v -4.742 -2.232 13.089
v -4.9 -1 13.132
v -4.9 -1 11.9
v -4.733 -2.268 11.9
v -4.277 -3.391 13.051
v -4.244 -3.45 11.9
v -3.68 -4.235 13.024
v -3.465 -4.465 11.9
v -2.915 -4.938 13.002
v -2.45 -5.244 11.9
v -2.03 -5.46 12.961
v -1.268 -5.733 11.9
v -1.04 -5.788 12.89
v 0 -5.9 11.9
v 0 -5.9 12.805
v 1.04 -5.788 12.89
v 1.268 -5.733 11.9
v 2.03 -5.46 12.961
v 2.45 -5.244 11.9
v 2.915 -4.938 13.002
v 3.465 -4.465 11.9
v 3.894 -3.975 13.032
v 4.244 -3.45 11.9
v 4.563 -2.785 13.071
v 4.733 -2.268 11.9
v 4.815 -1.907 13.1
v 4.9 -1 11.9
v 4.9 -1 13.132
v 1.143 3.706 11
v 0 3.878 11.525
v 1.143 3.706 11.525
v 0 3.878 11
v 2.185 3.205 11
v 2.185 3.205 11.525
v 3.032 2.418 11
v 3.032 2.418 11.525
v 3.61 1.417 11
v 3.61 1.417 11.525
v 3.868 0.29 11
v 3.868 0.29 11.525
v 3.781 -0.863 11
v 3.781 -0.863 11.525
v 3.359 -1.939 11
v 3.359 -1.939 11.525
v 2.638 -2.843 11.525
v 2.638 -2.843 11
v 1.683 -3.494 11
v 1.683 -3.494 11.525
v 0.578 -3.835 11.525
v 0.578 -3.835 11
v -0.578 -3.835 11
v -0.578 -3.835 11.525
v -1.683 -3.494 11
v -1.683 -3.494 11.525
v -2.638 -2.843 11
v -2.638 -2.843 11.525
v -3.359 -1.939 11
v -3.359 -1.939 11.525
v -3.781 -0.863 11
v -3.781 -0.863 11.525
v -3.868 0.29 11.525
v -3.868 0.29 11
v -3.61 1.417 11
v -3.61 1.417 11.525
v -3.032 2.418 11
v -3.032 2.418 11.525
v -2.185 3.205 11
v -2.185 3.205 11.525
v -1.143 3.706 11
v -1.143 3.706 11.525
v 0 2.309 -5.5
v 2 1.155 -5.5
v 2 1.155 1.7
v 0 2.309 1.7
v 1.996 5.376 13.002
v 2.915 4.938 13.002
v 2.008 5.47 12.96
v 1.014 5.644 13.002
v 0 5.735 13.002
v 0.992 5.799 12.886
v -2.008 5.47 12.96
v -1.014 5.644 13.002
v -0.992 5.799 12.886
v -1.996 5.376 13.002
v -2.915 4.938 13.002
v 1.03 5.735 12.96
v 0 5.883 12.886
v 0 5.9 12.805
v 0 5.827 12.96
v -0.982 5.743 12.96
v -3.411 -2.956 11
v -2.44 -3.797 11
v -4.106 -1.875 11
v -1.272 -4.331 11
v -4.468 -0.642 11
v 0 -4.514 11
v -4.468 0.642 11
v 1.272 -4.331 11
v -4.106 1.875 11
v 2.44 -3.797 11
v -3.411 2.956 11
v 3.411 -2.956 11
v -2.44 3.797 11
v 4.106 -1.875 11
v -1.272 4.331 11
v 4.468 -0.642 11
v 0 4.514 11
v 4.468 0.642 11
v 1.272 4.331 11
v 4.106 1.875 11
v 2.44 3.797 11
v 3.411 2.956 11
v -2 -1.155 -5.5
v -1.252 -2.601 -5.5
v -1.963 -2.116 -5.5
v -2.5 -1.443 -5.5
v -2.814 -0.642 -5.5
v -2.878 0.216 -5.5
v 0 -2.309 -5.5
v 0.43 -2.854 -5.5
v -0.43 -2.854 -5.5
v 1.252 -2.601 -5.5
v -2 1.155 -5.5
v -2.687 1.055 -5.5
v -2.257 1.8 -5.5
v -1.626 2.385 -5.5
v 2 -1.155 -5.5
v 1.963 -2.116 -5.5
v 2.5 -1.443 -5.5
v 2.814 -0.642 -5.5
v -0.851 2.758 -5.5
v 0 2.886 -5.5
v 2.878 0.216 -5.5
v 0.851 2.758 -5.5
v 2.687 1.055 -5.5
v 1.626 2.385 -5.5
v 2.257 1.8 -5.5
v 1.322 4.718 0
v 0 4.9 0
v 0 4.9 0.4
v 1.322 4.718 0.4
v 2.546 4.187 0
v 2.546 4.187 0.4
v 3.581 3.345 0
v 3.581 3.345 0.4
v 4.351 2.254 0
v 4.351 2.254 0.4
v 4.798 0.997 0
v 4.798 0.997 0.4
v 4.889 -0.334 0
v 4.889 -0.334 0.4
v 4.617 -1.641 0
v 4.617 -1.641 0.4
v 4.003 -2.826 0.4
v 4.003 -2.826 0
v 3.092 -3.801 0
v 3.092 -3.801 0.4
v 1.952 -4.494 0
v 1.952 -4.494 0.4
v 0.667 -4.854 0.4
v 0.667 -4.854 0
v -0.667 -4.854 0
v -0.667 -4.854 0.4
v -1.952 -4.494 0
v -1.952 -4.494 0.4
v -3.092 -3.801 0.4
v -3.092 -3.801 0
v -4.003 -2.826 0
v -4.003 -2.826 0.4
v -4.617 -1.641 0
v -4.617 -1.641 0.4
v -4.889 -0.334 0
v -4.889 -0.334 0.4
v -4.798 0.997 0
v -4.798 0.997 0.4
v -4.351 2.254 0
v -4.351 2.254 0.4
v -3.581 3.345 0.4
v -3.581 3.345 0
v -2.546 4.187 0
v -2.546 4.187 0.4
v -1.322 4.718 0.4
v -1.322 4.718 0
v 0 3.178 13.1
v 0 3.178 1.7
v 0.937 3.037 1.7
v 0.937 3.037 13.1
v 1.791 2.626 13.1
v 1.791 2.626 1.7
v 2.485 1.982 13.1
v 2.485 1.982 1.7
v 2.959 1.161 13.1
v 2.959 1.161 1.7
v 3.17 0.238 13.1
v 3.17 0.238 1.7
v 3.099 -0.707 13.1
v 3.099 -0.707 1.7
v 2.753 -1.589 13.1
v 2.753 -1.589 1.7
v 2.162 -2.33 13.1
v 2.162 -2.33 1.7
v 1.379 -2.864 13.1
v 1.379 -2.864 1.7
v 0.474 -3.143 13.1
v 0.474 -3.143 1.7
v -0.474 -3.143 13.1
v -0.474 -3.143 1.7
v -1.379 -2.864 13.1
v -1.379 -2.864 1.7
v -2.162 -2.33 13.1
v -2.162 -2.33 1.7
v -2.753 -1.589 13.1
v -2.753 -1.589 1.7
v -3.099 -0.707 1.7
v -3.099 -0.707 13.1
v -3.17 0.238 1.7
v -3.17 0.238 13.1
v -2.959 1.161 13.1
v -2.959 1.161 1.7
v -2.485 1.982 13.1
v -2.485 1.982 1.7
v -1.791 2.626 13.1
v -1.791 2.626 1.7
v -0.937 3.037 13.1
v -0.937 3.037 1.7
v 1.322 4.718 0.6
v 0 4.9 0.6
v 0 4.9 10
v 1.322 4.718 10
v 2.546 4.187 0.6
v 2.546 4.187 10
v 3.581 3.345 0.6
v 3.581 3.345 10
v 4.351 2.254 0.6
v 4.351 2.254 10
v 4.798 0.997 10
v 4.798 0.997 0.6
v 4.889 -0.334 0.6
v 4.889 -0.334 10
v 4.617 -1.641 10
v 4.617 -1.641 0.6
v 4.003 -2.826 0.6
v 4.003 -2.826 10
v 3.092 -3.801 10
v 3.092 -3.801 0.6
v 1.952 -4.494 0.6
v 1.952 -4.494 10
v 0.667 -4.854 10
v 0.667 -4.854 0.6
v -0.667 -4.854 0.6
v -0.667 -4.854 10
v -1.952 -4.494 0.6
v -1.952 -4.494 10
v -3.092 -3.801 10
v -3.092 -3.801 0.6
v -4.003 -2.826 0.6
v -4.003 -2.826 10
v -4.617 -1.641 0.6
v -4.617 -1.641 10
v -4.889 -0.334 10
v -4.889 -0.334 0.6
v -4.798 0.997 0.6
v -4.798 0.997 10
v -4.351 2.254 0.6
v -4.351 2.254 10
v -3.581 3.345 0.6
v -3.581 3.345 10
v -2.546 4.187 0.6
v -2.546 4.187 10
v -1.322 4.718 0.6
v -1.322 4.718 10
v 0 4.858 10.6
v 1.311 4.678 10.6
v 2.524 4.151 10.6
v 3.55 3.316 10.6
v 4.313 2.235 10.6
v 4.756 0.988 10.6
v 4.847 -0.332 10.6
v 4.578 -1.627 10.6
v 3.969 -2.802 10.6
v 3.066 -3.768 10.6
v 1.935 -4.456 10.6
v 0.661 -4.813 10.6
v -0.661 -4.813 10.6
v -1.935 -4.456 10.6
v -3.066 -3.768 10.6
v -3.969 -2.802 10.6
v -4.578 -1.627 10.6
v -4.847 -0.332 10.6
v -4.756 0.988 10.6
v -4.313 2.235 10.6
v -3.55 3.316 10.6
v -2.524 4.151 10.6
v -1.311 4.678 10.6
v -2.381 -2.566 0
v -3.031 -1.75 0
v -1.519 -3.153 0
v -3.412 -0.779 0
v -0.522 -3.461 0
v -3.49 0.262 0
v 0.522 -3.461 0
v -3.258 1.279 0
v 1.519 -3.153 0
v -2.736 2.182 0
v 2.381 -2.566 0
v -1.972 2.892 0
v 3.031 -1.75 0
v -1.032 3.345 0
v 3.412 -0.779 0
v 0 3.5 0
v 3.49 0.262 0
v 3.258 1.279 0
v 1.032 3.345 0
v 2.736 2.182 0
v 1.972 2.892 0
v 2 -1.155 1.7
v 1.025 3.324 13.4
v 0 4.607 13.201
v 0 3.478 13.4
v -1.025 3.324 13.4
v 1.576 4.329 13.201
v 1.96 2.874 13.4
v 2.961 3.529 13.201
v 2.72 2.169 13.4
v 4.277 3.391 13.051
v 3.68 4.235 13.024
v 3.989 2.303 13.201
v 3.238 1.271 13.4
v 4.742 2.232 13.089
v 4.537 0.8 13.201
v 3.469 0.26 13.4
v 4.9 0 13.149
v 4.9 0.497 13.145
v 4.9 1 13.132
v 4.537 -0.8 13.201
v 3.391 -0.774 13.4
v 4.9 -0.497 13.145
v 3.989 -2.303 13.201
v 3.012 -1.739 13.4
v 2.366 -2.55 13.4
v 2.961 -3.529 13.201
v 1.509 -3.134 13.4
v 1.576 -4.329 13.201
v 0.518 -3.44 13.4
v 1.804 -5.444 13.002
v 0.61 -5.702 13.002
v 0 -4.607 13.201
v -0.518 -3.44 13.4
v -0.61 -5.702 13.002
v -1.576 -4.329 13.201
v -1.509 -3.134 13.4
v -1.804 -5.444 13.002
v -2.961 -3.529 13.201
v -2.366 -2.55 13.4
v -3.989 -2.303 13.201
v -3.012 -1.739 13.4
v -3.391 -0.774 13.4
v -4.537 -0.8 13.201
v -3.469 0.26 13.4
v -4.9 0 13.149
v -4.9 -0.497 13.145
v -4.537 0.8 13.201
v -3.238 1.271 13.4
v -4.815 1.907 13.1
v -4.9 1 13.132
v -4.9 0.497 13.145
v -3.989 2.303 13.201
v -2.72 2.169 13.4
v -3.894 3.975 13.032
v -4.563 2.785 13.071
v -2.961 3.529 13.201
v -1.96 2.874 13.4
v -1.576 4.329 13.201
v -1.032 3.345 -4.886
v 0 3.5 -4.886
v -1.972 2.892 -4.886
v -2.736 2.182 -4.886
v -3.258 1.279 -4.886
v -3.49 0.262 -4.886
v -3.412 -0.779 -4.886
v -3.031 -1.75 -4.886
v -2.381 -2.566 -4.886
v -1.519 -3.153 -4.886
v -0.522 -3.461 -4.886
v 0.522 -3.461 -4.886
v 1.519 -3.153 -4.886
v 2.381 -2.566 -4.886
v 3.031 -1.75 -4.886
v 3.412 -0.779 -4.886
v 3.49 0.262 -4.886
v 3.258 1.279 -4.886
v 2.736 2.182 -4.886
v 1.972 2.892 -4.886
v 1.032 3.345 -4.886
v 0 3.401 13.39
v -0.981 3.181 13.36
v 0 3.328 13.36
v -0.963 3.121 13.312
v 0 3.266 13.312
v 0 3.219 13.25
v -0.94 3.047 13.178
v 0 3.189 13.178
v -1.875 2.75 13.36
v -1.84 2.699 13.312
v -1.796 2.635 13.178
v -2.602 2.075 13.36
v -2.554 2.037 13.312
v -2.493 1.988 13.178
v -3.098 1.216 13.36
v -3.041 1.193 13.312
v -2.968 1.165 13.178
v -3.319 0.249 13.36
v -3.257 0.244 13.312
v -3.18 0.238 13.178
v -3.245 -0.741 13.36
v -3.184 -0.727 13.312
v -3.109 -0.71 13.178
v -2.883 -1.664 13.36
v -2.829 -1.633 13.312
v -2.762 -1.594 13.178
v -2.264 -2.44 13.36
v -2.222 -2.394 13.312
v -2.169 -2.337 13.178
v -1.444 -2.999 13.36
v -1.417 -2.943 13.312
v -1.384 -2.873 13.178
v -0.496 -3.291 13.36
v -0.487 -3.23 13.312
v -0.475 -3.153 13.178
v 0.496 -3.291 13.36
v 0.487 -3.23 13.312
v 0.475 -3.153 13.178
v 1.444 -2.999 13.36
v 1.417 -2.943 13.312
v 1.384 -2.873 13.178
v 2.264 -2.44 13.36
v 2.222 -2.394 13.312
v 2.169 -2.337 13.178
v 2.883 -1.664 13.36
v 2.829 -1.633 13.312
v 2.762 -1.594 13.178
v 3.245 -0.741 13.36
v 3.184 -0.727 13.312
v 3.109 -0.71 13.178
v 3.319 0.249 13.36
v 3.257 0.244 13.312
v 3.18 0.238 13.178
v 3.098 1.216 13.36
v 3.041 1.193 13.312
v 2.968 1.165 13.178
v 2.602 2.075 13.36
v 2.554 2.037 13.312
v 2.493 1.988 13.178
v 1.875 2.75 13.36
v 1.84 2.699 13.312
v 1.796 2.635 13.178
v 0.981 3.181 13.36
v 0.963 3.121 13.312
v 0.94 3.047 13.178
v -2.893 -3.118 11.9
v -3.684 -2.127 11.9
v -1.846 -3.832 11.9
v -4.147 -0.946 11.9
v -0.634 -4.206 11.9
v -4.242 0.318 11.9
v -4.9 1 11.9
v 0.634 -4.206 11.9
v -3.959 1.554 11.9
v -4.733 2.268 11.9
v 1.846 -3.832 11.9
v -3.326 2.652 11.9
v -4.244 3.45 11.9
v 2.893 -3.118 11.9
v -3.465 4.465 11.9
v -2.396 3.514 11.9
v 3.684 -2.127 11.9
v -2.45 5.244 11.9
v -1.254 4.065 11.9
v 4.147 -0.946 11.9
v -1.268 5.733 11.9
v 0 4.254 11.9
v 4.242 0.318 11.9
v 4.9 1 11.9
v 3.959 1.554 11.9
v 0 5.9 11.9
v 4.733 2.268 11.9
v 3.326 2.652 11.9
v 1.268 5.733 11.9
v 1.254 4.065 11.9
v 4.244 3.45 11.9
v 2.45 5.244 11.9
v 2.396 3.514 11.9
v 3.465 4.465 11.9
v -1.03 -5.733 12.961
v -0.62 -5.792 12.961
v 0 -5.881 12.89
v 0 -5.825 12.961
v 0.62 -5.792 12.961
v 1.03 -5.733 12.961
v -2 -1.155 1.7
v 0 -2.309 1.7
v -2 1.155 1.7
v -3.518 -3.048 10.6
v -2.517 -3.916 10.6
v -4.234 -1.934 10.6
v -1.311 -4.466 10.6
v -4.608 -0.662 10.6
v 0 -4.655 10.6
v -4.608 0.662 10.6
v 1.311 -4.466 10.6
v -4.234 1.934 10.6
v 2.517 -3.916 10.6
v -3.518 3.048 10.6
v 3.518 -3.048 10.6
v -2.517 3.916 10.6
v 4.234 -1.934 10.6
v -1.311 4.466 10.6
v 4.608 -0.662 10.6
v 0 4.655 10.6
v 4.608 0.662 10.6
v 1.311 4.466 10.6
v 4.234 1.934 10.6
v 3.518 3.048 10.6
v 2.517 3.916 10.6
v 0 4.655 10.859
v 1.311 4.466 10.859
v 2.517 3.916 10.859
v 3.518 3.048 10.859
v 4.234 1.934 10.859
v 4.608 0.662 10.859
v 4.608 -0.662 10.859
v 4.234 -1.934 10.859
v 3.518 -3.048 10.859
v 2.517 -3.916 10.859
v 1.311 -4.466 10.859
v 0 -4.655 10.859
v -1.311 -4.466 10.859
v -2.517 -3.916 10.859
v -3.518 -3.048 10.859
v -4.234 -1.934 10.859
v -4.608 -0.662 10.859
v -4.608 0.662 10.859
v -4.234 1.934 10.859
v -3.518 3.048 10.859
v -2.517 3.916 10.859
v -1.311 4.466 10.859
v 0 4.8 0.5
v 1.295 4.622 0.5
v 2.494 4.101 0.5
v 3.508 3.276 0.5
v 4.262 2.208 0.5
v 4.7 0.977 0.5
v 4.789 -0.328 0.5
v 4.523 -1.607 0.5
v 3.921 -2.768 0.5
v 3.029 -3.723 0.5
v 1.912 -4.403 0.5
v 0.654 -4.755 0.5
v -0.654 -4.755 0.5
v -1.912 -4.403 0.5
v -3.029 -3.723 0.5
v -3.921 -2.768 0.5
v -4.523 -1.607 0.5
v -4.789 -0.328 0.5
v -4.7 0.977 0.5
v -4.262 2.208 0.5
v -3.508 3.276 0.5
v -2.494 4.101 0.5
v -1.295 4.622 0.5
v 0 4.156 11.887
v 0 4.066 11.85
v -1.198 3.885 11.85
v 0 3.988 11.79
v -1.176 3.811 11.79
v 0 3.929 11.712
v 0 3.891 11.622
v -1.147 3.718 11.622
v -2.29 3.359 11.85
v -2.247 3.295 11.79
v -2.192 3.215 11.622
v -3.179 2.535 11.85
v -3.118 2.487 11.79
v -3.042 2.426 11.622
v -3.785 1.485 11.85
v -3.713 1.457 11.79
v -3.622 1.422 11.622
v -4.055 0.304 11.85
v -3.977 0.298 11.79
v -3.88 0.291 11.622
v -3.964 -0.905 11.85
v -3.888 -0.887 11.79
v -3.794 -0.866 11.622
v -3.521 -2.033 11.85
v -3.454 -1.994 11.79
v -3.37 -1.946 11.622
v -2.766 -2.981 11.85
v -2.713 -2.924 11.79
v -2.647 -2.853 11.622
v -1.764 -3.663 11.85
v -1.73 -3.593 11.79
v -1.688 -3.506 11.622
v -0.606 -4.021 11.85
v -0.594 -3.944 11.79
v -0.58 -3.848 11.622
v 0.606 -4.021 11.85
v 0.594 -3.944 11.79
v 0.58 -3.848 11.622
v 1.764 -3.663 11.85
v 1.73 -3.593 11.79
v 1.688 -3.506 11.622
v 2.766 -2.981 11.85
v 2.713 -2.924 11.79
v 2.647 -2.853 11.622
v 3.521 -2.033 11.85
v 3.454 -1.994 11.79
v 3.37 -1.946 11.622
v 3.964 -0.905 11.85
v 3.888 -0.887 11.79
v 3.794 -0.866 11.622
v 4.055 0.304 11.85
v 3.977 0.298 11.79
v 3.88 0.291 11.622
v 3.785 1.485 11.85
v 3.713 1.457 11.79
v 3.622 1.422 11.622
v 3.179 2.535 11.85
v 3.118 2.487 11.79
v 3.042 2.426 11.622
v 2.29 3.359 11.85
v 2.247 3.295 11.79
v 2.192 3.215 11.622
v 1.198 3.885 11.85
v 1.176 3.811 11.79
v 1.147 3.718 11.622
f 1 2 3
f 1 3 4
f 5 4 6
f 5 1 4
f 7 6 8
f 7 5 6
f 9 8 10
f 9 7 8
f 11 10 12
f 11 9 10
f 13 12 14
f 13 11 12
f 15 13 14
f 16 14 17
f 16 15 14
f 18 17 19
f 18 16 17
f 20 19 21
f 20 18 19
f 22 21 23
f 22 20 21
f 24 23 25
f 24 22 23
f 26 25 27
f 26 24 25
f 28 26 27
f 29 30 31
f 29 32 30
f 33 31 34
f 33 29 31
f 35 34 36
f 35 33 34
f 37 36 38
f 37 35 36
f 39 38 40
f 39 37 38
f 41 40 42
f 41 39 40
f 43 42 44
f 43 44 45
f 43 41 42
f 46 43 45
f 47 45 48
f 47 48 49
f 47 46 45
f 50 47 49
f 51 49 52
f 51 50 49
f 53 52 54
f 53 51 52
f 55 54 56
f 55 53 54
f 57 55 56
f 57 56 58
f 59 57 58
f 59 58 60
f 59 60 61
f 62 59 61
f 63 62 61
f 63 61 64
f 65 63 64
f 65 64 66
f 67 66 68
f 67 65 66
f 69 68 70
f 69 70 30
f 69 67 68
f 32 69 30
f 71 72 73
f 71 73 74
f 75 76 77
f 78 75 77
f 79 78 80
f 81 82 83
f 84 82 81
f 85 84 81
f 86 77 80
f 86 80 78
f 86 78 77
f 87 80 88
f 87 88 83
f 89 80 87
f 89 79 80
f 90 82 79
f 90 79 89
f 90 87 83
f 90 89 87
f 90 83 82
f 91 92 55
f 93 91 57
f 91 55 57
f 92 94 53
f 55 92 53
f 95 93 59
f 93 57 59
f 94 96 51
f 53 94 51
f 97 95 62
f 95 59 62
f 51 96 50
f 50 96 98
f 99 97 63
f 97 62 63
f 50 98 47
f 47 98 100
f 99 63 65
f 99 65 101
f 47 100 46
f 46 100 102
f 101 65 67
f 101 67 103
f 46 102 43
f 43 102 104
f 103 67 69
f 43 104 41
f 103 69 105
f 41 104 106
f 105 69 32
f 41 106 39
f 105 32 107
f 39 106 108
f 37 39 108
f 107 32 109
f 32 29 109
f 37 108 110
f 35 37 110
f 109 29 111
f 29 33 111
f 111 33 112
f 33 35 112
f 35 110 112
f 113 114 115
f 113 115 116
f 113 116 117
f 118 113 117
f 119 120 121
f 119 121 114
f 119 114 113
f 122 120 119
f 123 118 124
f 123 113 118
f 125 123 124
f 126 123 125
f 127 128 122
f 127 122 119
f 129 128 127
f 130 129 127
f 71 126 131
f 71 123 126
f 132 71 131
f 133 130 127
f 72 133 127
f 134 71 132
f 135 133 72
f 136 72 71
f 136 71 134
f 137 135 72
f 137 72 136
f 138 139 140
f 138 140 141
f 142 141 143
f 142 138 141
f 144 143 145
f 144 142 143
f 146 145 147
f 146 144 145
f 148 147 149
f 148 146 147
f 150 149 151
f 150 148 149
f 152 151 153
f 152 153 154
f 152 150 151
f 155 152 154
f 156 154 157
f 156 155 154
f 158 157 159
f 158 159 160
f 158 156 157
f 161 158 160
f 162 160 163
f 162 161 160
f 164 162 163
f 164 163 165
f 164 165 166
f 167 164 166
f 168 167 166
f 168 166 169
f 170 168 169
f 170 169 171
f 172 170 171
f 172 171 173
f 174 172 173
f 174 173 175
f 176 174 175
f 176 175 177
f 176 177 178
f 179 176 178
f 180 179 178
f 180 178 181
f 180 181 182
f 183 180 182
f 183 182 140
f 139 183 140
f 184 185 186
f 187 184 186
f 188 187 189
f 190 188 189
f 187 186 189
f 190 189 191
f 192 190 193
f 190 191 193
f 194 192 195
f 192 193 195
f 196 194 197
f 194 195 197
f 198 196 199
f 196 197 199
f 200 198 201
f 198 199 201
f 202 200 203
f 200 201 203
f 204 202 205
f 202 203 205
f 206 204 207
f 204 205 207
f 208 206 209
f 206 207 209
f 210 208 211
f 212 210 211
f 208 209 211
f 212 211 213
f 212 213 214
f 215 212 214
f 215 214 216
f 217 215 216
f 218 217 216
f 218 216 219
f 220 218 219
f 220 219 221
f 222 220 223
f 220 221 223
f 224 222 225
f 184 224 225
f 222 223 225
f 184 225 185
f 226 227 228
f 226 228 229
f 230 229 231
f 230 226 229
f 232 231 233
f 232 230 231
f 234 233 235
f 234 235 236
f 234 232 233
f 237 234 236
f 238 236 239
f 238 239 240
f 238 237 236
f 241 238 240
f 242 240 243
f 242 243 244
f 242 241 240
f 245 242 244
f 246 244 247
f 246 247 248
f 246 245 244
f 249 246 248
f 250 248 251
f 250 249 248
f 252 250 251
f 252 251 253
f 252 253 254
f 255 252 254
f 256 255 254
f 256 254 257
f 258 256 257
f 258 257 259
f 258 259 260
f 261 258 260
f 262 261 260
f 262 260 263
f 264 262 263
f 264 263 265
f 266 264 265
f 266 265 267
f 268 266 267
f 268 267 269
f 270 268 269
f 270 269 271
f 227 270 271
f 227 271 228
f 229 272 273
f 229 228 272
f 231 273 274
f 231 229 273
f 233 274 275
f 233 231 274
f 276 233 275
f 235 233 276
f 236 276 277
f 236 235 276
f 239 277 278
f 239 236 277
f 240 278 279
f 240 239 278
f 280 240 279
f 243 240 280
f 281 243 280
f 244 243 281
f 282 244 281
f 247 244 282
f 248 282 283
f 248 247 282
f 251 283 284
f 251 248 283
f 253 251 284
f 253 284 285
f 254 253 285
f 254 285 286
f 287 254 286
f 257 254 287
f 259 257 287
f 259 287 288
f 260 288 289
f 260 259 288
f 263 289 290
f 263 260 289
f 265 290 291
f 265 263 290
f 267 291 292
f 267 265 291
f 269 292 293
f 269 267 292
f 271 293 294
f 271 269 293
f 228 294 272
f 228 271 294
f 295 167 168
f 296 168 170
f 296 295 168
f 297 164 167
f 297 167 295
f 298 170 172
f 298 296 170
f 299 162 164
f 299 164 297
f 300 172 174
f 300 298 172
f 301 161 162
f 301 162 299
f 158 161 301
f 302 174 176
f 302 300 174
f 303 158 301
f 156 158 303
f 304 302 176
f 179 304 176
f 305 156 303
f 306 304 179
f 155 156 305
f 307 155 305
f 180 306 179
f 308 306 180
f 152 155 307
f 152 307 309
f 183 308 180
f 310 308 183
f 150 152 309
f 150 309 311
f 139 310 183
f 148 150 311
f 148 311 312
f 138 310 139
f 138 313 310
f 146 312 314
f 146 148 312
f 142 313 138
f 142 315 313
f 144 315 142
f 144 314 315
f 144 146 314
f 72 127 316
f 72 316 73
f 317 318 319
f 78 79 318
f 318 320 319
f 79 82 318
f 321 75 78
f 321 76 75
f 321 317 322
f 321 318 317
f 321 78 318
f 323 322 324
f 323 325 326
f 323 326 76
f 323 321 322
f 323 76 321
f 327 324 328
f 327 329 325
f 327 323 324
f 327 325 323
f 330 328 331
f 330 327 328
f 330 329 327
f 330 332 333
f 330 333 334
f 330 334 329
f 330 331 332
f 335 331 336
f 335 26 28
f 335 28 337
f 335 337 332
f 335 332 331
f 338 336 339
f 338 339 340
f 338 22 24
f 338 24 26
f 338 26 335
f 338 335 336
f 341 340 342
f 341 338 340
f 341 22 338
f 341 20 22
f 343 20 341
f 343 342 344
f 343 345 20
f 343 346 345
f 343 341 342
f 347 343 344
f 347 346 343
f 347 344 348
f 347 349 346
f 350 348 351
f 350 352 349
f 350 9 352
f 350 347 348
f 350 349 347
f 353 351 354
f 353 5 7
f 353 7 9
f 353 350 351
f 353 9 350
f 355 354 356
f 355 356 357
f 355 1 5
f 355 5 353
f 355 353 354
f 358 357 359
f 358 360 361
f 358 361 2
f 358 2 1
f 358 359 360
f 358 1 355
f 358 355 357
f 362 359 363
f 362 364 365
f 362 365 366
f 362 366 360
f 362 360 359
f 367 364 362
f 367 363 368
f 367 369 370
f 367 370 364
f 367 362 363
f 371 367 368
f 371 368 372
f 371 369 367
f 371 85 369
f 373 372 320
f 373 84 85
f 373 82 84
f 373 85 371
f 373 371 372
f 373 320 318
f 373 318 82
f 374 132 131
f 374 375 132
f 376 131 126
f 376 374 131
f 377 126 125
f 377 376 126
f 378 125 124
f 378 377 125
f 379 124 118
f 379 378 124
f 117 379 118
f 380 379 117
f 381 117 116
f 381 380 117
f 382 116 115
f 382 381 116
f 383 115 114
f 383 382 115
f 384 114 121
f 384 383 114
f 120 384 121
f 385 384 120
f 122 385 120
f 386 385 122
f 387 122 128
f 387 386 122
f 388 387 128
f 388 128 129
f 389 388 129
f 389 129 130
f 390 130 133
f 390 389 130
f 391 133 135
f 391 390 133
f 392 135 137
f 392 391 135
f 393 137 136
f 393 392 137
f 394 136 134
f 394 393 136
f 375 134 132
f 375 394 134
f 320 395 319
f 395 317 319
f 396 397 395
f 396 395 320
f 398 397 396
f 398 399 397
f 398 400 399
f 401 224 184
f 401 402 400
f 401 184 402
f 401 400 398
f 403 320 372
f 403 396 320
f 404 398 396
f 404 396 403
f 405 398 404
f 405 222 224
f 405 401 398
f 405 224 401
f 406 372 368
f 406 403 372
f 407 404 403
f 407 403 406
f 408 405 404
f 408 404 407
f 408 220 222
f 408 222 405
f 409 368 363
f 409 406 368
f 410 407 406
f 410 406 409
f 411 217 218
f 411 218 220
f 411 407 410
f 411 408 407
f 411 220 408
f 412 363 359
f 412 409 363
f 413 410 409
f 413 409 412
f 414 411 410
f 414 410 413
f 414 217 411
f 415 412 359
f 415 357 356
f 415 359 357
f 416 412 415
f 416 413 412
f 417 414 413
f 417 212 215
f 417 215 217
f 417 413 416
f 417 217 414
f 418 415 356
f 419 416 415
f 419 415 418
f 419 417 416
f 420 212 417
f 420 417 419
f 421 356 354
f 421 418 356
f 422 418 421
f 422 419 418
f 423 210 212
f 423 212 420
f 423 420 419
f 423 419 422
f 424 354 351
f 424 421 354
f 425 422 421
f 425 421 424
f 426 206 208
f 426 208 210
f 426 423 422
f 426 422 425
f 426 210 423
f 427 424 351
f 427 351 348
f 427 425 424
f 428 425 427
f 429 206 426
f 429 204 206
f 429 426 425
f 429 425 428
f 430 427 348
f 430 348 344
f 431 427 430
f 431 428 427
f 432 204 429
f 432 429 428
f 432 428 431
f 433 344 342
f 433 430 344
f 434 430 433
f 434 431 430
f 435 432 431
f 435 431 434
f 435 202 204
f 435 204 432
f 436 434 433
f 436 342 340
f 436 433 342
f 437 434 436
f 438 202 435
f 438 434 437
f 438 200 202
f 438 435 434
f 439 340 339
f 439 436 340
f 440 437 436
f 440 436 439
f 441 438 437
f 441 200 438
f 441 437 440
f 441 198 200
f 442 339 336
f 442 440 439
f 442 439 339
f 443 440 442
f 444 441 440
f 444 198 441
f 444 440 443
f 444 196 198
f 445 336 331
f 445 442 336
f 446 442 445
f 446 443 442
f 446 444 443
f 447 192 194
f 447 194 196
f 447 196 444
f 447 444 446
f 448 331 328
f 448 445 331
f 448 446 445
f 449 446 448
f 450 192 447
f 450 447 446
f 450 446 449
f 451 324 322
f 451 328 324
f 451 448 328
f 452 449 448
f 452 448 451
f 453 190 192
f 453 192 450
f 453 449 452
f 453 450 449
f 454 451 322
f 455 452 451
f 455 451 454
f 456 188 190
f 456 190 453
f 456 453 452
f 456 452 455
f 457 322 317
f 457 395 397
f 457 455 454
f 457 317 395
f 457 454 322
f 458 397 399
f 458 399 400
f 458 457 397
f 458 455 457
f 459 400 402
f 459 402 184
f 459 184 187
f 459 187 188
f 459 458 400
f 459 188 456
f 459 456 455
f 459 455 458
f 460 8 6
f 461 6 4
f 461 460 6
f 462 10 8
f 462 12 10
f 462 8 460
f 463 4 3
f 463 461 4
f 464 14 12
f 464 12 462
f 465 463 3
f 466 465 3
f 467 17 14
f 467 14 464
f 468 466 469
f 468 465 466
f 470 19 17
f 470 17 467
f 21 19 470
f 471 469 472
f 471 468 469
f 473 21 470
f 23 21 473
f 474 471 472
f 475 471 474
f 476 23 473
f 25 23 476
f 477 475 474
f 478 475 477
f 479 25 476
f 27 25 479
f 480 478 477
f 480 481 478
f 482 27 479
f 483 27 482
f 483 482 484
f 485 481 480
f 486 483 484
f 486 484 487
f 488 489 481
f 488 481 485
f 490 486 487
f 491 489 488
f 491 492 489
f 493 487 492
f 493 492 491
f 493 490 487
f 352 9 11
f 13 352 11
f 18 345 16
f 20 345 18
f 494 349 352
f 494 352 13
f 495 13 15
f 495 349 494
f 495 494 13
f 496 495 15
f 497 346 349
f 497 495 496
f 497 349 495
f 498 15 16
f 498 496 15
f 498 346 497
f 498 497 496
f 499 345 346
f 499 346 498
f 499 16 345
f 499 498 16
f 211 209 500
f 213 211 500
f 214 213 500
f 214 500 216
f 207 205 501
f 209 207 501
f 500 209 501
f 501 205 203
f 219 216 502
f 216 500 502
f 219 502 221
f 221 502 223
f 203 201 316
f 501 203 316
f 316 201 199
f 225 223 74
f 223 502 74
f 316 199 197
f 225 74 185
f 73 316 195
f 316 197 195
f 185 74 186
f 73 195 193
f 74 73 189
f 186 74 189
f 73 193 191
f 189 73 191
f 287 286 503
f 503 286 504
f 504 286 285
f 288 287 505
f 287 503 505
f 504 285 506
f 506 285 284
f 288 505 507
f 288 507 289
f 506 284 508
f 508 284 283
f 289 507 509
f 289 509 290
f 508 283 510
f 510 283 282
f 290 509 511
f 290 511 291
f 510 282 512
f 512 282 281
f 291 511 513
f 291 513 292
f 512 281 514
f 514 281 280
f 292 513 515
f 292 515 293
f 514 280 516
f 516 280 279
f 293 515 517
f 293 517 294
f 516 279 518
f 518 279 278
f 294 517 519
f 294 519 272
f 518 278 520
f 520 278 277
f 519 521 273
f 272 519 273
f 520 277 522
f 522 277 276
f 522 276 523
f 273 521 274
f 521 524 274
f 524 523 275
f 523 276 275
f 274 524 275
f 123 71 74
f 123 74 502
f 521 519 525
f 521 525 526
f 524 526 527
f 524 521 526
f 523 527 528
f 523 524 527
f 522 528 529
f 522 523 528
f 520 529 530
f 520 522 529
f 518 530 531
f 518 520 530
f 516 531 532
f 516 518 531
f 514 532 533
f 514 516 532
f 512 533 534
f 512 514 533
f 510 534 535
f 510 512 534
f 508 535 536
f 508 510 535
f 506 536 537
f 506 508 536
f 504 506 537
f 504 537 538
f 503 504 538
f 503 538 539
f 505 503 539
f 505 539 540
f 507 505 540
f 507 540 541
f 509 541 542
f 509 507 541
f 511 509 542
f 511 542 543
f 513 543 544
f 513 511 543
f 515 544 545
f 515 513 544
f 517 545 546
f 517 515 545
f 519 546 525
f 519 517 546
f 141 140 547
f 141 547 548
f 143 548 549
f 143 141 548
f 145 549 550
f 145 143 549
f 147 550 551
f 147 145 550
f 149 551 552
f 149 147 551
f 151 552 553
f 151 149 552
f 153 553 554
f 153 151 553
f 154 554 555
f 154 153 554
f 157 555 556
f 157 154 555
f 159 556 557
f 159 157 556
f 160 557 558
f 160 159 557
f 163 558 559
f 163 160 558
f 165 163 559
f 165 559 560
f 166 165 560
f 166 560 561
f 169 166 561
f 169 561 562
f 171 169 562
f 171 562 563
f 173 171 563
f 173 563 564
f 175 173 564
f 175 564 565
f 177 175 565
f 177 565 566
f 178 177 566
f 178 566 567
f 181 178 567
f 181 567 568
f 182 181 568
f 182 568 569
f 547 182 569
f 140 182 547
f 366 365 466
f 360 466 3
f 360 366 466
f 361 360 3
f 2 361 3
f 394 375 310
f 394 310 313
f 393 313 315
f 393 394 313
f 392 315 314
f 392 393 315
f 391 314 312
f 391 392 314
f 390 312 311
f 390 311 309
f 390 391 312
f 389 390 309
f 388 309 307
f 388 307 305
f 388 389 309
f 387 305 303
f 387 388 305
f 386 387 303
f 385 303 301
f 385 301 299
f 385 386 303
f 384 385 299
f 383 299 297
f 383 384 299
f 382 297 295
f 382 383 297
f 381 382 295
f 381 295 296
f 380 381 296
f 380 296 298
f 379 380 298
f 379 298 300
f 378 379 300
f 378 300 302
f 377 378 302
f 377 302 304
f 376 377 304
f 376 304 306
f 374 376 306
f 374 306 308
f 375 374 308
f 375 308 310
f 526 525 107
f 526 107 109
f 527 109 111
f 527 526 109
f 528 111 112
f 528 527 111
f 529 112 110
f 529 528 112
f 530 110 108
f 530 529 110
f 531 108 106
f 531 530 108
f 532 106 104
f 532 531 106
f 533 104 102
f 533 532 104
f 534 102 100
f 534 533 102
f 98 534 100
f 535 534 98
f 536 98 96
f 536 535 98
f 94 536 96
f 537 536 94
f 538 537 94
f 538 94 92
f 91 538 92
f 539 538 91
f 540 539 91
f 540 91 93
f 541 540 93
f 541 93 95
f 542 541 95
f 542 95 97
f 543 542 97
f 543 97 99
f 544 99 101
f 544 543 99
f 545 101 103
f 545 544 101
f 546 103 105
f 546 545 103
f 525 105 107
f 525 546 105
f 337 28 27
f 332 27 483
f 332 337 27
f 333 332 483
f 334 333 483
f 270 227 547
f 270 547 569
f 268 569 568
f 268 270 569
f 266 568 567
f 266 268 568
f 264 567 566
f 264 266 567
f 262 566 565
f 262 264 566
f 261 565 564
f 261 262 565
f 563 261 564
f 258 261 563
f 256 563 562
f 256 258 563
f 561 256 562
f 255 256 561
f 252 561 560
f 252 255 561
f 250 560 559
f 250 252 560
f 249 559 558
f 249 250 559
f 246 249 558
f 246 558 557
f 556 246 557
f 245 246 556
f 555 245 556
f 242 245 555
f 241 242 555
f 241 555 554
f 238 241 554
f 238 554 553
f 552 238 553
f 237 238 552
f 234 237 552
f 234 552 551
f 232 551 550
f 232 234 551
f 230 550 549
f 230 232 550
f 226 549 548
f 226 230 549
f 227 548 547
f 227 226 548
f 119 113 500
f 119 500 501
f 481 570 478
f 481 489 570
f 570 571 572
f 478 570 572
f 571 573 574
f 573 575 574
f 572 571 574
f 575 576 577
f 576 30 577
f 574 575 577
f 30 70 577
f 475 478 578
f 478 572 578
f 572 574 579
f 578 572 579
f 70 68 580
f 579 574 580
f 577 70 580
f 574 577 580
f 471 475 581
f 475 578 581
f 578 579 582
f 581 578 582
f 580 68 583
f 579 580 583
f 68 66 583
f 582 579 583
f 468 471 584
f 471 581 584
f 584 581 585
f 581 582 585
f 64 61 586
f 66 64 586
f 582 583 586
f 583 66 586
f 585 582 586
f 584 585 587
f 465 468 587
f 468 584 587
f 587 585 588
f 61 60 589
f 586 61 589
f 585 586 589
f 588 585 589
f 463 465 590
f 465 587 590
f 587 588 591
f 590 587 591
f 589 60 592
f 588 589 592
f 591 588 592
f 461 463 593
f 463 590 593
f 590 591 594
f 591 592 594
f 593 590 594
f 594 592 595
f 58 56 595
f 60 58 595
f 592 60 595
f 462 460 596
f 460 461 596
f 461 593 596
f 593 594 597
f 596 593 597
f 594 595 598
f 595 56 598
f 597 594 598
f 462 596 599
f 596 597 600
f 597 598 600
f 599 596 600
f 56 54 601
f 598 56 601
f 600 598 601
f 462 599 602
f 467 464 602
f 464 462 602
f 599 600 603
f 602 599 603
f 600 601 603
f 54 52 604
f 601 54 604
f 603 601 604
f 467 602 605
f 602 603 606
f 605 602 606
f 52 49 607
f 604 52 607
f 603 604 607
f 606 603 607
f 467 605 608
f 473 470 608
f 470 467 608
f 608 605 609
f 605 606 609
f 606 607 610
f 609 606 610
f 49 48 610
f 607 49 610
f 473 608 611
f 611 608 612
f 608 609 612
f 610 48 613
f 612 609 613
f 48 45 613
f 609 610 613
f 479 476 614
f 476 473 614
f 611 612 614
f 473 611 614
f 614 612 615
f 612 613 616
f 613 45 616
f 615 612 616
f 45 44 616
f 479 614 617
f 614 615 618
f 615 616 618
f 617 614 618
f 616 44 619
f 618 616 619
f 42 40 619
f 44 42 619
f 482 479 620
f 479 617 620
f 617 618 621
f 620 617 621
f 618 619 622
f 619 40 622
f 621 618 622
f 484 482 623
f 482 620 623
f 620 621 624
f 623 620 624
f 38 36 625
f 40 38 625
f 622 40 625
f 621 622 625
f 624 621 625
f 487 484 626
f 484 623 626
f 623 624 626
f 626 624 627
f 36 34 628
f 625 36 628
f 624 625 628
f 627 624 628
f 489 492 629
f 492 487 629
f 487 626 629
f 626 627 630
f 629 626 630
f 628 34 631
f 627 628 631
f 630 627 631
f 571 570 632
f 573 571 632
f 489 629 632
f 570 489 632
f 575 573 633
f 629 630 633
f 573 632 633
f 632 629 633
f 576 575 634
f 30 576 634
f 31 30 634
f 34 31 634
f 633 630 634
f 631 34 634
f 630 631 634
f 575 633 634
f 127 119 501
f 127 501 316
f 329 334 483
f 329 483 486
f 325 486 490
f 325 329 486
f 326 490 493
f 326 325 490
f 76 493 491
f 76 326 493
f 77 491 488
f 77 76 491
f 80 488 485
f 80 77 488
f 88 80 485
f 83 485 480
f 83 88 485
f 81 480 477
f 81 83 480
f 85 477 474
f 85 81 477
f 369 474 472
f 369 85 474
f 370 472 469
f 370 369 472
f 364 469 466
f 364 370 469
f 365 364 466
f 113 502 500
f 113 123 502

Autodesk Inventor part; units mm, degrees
sketch "Sketch_1" plane through (0, 0, 0) normal (1, 0, 0) x (0, 1, 0)
  line L0 (0, -5.5) -> (0, 13.4)
  line L1 (0, 13.4) -> (3.4785, 13.4)
  line L2 (3.4785, 13.4) -> (5.7347, 13.0022)
  arc A0 (5.9, 12.8052) -> (5.7347, 13.0022) centre (5.7, 12.8052) ccw
  line L3 (5.9, 12.8052) -> (5.9, 11.9)
  line L4 (5.9, 11.9) -> (4.2535, 11.9)
  arc A1 (4.2535, 11.9) -> (3.8785, 11.525) centre (4.2535, 11.525) ccw
  line L5 (3.8785, 11.525) -> (3.8785, 11)
  line L6 (3.8785, 11) -> (4.5136, 11)
  line L7 (4.5136, 11) -> (4.655, 10.8586)
  line L8 (4.655, 10.8586) -> (4.655, 10.6)
  line L9 (4.655, 10.6) -> (4.858, 10.6)
  line L10 (4.858, 10.6) -> (4.9, 10)
  line L11 (4.9, 10) -> (4.9, 0.6)
  line L12 (4.9, 0.6) -> (4.8, 0.5)
  line L13 (4.8, 0.5) -> (4.9, 0.4)
  line L14 (4.9, 0.4) -> (4.9, 0)
  line L15 (4.9, 0) -> (3.5, 0)
  line L16 (3.5, 0) -> (3.5, -4.8865)
  line L17 (3.5, -4.8865) -> (2.8865, -5.5)
  line L18 (2.8865, -5.5) -> (0, -5.5)
  line L19 (0, -5.5) -> (0, 13.4)
revolve "Revolution1" add sketch "Sketch_1" angle 360 about axis through (0, 0, -5.5) along (0, 0, -1)
thread "Thread1" size "M7x1" class "6g" standard "ISO Metric profile" length 4.3865
sketch "Sketch_2" plane through (0, 0, 13.4) normal (0, 0, 1) x (1, 0, 0)
  line L0 (-11.8, -11.8) -> (11.8, -11.8)
  line L1 (11.8, -11.8) -> (11.8, 11.8)
  line L2 (11.8, 11.8) -> (-11.8, 11.8)
  line L3 (-11.8, 11.8) -> (-11.8, -11.8)
  line L4 (-4.9, 1) -> (-4.9, -1)
  arc A0 (-4.9, -1) -> (4.9, -1) centre (0, -1) ccw
  line L5 (4.9, -1) -> (4.9, 1)
  arc A1 (4.9, 1) -> (-4.9, 1) centre (0, 1) ccw
extrude "Extrusion1" cut sketch "Sketch_2" against normal blind 1.5
sketch "Sketch_3" plane through (0, 0, -5.5) normal (0, 0, 1) x (1, 0, 0)
  line L0 (-2, -1.1547) -> (0, -2.3094)
  line L1 (0, -2.3094) -> (2, -1.1547)
  line L2 (2, -1.1547) -> (2, 1.1547)
  line L3 (2, 1.1547) -> (0, 2.3094)
  line L4 (0, 2.3094) -> (-2, 1.1547)
  line L5 (-2, 1.1547) -> (-2, -1.1547)
extrude "Extrusion2" cut sketch "Sketch_3" along normal blind 7.2
sketch "Sketch_4" plane through (0, 0, 0) normal (1, 0, 0) x (0, 1, 0)
  line L0 (0, 1.7) -> (0, 13.4)
  line L1 (0, 13.4) -> (3.4785, 13.4)
  arc A0 (3.4785, 13.4) -> (3.1785, 13.1) centre (3.4785, 13.1) ccw
  line L2 (3.1785, 13.1) -> (3.1785, 1.7)
  line L3 (3.1785, 1.7) -> (0, 1.7)
  line L4 (0, 1.7) -> (0, 13.4)
revolve "Revolution2" cut sketch "Sketch_4" angle 360 about axis through (0, 0, 1.7) along (0, 0, -1)
ref_plane "ANBAU_XY" through (0, 0, 0) normal (0, 0, -1) x (1, 0, 0)
ref_plane "ANBAU_YZ" through (0, 0, 0) normal (1, 0, 0) x (0, -1, 0)
ref_plane "ANBAU_ZX" through (0, 0, 0) normal (0, -1, 0) x (0, 0, -1)
ref_plane "ANBAU_STD_XY" through (0, 0, 0) normal (0, 0, 1) x (1, 0, 0)
ref_plane "ANBAU_STD_YZ" through (0, 0, 0) normal (1, 0, 0) x (0, 1, 0)
ref_plane "ANBAU_STD_ZX" through (0, 0, 0) normal (0, 1, 0) x (0, 0, 1)
ref_plane "CPV_XY" through (0, 0, 0) normal (0, 0, 1) x (1, 0, 0)
ref_plane "CPV_YZ" through (0, 0, 0) normal (1, 0, 0) x (0, 1, 0)
ref_plane "CPV_ZX" through (0, 0, 0) normal (0, 1, 0) x (0, 0, 1)
ref_plane "CPV_ANBAU_XY" through (0, 0, 0) normal (0, 0, 1) x (1, 0, 0)
ref_plane "CPV_ANBAU_YZ" through (0, 0, 0) normal (1, 0, 0) x (0, 1, 0)
ref_plane "CPV_ANBAU_ZX" through (0, 0, 0) normal (0, 1, 0) x (0, 0, 1)
properties part number "183740"
